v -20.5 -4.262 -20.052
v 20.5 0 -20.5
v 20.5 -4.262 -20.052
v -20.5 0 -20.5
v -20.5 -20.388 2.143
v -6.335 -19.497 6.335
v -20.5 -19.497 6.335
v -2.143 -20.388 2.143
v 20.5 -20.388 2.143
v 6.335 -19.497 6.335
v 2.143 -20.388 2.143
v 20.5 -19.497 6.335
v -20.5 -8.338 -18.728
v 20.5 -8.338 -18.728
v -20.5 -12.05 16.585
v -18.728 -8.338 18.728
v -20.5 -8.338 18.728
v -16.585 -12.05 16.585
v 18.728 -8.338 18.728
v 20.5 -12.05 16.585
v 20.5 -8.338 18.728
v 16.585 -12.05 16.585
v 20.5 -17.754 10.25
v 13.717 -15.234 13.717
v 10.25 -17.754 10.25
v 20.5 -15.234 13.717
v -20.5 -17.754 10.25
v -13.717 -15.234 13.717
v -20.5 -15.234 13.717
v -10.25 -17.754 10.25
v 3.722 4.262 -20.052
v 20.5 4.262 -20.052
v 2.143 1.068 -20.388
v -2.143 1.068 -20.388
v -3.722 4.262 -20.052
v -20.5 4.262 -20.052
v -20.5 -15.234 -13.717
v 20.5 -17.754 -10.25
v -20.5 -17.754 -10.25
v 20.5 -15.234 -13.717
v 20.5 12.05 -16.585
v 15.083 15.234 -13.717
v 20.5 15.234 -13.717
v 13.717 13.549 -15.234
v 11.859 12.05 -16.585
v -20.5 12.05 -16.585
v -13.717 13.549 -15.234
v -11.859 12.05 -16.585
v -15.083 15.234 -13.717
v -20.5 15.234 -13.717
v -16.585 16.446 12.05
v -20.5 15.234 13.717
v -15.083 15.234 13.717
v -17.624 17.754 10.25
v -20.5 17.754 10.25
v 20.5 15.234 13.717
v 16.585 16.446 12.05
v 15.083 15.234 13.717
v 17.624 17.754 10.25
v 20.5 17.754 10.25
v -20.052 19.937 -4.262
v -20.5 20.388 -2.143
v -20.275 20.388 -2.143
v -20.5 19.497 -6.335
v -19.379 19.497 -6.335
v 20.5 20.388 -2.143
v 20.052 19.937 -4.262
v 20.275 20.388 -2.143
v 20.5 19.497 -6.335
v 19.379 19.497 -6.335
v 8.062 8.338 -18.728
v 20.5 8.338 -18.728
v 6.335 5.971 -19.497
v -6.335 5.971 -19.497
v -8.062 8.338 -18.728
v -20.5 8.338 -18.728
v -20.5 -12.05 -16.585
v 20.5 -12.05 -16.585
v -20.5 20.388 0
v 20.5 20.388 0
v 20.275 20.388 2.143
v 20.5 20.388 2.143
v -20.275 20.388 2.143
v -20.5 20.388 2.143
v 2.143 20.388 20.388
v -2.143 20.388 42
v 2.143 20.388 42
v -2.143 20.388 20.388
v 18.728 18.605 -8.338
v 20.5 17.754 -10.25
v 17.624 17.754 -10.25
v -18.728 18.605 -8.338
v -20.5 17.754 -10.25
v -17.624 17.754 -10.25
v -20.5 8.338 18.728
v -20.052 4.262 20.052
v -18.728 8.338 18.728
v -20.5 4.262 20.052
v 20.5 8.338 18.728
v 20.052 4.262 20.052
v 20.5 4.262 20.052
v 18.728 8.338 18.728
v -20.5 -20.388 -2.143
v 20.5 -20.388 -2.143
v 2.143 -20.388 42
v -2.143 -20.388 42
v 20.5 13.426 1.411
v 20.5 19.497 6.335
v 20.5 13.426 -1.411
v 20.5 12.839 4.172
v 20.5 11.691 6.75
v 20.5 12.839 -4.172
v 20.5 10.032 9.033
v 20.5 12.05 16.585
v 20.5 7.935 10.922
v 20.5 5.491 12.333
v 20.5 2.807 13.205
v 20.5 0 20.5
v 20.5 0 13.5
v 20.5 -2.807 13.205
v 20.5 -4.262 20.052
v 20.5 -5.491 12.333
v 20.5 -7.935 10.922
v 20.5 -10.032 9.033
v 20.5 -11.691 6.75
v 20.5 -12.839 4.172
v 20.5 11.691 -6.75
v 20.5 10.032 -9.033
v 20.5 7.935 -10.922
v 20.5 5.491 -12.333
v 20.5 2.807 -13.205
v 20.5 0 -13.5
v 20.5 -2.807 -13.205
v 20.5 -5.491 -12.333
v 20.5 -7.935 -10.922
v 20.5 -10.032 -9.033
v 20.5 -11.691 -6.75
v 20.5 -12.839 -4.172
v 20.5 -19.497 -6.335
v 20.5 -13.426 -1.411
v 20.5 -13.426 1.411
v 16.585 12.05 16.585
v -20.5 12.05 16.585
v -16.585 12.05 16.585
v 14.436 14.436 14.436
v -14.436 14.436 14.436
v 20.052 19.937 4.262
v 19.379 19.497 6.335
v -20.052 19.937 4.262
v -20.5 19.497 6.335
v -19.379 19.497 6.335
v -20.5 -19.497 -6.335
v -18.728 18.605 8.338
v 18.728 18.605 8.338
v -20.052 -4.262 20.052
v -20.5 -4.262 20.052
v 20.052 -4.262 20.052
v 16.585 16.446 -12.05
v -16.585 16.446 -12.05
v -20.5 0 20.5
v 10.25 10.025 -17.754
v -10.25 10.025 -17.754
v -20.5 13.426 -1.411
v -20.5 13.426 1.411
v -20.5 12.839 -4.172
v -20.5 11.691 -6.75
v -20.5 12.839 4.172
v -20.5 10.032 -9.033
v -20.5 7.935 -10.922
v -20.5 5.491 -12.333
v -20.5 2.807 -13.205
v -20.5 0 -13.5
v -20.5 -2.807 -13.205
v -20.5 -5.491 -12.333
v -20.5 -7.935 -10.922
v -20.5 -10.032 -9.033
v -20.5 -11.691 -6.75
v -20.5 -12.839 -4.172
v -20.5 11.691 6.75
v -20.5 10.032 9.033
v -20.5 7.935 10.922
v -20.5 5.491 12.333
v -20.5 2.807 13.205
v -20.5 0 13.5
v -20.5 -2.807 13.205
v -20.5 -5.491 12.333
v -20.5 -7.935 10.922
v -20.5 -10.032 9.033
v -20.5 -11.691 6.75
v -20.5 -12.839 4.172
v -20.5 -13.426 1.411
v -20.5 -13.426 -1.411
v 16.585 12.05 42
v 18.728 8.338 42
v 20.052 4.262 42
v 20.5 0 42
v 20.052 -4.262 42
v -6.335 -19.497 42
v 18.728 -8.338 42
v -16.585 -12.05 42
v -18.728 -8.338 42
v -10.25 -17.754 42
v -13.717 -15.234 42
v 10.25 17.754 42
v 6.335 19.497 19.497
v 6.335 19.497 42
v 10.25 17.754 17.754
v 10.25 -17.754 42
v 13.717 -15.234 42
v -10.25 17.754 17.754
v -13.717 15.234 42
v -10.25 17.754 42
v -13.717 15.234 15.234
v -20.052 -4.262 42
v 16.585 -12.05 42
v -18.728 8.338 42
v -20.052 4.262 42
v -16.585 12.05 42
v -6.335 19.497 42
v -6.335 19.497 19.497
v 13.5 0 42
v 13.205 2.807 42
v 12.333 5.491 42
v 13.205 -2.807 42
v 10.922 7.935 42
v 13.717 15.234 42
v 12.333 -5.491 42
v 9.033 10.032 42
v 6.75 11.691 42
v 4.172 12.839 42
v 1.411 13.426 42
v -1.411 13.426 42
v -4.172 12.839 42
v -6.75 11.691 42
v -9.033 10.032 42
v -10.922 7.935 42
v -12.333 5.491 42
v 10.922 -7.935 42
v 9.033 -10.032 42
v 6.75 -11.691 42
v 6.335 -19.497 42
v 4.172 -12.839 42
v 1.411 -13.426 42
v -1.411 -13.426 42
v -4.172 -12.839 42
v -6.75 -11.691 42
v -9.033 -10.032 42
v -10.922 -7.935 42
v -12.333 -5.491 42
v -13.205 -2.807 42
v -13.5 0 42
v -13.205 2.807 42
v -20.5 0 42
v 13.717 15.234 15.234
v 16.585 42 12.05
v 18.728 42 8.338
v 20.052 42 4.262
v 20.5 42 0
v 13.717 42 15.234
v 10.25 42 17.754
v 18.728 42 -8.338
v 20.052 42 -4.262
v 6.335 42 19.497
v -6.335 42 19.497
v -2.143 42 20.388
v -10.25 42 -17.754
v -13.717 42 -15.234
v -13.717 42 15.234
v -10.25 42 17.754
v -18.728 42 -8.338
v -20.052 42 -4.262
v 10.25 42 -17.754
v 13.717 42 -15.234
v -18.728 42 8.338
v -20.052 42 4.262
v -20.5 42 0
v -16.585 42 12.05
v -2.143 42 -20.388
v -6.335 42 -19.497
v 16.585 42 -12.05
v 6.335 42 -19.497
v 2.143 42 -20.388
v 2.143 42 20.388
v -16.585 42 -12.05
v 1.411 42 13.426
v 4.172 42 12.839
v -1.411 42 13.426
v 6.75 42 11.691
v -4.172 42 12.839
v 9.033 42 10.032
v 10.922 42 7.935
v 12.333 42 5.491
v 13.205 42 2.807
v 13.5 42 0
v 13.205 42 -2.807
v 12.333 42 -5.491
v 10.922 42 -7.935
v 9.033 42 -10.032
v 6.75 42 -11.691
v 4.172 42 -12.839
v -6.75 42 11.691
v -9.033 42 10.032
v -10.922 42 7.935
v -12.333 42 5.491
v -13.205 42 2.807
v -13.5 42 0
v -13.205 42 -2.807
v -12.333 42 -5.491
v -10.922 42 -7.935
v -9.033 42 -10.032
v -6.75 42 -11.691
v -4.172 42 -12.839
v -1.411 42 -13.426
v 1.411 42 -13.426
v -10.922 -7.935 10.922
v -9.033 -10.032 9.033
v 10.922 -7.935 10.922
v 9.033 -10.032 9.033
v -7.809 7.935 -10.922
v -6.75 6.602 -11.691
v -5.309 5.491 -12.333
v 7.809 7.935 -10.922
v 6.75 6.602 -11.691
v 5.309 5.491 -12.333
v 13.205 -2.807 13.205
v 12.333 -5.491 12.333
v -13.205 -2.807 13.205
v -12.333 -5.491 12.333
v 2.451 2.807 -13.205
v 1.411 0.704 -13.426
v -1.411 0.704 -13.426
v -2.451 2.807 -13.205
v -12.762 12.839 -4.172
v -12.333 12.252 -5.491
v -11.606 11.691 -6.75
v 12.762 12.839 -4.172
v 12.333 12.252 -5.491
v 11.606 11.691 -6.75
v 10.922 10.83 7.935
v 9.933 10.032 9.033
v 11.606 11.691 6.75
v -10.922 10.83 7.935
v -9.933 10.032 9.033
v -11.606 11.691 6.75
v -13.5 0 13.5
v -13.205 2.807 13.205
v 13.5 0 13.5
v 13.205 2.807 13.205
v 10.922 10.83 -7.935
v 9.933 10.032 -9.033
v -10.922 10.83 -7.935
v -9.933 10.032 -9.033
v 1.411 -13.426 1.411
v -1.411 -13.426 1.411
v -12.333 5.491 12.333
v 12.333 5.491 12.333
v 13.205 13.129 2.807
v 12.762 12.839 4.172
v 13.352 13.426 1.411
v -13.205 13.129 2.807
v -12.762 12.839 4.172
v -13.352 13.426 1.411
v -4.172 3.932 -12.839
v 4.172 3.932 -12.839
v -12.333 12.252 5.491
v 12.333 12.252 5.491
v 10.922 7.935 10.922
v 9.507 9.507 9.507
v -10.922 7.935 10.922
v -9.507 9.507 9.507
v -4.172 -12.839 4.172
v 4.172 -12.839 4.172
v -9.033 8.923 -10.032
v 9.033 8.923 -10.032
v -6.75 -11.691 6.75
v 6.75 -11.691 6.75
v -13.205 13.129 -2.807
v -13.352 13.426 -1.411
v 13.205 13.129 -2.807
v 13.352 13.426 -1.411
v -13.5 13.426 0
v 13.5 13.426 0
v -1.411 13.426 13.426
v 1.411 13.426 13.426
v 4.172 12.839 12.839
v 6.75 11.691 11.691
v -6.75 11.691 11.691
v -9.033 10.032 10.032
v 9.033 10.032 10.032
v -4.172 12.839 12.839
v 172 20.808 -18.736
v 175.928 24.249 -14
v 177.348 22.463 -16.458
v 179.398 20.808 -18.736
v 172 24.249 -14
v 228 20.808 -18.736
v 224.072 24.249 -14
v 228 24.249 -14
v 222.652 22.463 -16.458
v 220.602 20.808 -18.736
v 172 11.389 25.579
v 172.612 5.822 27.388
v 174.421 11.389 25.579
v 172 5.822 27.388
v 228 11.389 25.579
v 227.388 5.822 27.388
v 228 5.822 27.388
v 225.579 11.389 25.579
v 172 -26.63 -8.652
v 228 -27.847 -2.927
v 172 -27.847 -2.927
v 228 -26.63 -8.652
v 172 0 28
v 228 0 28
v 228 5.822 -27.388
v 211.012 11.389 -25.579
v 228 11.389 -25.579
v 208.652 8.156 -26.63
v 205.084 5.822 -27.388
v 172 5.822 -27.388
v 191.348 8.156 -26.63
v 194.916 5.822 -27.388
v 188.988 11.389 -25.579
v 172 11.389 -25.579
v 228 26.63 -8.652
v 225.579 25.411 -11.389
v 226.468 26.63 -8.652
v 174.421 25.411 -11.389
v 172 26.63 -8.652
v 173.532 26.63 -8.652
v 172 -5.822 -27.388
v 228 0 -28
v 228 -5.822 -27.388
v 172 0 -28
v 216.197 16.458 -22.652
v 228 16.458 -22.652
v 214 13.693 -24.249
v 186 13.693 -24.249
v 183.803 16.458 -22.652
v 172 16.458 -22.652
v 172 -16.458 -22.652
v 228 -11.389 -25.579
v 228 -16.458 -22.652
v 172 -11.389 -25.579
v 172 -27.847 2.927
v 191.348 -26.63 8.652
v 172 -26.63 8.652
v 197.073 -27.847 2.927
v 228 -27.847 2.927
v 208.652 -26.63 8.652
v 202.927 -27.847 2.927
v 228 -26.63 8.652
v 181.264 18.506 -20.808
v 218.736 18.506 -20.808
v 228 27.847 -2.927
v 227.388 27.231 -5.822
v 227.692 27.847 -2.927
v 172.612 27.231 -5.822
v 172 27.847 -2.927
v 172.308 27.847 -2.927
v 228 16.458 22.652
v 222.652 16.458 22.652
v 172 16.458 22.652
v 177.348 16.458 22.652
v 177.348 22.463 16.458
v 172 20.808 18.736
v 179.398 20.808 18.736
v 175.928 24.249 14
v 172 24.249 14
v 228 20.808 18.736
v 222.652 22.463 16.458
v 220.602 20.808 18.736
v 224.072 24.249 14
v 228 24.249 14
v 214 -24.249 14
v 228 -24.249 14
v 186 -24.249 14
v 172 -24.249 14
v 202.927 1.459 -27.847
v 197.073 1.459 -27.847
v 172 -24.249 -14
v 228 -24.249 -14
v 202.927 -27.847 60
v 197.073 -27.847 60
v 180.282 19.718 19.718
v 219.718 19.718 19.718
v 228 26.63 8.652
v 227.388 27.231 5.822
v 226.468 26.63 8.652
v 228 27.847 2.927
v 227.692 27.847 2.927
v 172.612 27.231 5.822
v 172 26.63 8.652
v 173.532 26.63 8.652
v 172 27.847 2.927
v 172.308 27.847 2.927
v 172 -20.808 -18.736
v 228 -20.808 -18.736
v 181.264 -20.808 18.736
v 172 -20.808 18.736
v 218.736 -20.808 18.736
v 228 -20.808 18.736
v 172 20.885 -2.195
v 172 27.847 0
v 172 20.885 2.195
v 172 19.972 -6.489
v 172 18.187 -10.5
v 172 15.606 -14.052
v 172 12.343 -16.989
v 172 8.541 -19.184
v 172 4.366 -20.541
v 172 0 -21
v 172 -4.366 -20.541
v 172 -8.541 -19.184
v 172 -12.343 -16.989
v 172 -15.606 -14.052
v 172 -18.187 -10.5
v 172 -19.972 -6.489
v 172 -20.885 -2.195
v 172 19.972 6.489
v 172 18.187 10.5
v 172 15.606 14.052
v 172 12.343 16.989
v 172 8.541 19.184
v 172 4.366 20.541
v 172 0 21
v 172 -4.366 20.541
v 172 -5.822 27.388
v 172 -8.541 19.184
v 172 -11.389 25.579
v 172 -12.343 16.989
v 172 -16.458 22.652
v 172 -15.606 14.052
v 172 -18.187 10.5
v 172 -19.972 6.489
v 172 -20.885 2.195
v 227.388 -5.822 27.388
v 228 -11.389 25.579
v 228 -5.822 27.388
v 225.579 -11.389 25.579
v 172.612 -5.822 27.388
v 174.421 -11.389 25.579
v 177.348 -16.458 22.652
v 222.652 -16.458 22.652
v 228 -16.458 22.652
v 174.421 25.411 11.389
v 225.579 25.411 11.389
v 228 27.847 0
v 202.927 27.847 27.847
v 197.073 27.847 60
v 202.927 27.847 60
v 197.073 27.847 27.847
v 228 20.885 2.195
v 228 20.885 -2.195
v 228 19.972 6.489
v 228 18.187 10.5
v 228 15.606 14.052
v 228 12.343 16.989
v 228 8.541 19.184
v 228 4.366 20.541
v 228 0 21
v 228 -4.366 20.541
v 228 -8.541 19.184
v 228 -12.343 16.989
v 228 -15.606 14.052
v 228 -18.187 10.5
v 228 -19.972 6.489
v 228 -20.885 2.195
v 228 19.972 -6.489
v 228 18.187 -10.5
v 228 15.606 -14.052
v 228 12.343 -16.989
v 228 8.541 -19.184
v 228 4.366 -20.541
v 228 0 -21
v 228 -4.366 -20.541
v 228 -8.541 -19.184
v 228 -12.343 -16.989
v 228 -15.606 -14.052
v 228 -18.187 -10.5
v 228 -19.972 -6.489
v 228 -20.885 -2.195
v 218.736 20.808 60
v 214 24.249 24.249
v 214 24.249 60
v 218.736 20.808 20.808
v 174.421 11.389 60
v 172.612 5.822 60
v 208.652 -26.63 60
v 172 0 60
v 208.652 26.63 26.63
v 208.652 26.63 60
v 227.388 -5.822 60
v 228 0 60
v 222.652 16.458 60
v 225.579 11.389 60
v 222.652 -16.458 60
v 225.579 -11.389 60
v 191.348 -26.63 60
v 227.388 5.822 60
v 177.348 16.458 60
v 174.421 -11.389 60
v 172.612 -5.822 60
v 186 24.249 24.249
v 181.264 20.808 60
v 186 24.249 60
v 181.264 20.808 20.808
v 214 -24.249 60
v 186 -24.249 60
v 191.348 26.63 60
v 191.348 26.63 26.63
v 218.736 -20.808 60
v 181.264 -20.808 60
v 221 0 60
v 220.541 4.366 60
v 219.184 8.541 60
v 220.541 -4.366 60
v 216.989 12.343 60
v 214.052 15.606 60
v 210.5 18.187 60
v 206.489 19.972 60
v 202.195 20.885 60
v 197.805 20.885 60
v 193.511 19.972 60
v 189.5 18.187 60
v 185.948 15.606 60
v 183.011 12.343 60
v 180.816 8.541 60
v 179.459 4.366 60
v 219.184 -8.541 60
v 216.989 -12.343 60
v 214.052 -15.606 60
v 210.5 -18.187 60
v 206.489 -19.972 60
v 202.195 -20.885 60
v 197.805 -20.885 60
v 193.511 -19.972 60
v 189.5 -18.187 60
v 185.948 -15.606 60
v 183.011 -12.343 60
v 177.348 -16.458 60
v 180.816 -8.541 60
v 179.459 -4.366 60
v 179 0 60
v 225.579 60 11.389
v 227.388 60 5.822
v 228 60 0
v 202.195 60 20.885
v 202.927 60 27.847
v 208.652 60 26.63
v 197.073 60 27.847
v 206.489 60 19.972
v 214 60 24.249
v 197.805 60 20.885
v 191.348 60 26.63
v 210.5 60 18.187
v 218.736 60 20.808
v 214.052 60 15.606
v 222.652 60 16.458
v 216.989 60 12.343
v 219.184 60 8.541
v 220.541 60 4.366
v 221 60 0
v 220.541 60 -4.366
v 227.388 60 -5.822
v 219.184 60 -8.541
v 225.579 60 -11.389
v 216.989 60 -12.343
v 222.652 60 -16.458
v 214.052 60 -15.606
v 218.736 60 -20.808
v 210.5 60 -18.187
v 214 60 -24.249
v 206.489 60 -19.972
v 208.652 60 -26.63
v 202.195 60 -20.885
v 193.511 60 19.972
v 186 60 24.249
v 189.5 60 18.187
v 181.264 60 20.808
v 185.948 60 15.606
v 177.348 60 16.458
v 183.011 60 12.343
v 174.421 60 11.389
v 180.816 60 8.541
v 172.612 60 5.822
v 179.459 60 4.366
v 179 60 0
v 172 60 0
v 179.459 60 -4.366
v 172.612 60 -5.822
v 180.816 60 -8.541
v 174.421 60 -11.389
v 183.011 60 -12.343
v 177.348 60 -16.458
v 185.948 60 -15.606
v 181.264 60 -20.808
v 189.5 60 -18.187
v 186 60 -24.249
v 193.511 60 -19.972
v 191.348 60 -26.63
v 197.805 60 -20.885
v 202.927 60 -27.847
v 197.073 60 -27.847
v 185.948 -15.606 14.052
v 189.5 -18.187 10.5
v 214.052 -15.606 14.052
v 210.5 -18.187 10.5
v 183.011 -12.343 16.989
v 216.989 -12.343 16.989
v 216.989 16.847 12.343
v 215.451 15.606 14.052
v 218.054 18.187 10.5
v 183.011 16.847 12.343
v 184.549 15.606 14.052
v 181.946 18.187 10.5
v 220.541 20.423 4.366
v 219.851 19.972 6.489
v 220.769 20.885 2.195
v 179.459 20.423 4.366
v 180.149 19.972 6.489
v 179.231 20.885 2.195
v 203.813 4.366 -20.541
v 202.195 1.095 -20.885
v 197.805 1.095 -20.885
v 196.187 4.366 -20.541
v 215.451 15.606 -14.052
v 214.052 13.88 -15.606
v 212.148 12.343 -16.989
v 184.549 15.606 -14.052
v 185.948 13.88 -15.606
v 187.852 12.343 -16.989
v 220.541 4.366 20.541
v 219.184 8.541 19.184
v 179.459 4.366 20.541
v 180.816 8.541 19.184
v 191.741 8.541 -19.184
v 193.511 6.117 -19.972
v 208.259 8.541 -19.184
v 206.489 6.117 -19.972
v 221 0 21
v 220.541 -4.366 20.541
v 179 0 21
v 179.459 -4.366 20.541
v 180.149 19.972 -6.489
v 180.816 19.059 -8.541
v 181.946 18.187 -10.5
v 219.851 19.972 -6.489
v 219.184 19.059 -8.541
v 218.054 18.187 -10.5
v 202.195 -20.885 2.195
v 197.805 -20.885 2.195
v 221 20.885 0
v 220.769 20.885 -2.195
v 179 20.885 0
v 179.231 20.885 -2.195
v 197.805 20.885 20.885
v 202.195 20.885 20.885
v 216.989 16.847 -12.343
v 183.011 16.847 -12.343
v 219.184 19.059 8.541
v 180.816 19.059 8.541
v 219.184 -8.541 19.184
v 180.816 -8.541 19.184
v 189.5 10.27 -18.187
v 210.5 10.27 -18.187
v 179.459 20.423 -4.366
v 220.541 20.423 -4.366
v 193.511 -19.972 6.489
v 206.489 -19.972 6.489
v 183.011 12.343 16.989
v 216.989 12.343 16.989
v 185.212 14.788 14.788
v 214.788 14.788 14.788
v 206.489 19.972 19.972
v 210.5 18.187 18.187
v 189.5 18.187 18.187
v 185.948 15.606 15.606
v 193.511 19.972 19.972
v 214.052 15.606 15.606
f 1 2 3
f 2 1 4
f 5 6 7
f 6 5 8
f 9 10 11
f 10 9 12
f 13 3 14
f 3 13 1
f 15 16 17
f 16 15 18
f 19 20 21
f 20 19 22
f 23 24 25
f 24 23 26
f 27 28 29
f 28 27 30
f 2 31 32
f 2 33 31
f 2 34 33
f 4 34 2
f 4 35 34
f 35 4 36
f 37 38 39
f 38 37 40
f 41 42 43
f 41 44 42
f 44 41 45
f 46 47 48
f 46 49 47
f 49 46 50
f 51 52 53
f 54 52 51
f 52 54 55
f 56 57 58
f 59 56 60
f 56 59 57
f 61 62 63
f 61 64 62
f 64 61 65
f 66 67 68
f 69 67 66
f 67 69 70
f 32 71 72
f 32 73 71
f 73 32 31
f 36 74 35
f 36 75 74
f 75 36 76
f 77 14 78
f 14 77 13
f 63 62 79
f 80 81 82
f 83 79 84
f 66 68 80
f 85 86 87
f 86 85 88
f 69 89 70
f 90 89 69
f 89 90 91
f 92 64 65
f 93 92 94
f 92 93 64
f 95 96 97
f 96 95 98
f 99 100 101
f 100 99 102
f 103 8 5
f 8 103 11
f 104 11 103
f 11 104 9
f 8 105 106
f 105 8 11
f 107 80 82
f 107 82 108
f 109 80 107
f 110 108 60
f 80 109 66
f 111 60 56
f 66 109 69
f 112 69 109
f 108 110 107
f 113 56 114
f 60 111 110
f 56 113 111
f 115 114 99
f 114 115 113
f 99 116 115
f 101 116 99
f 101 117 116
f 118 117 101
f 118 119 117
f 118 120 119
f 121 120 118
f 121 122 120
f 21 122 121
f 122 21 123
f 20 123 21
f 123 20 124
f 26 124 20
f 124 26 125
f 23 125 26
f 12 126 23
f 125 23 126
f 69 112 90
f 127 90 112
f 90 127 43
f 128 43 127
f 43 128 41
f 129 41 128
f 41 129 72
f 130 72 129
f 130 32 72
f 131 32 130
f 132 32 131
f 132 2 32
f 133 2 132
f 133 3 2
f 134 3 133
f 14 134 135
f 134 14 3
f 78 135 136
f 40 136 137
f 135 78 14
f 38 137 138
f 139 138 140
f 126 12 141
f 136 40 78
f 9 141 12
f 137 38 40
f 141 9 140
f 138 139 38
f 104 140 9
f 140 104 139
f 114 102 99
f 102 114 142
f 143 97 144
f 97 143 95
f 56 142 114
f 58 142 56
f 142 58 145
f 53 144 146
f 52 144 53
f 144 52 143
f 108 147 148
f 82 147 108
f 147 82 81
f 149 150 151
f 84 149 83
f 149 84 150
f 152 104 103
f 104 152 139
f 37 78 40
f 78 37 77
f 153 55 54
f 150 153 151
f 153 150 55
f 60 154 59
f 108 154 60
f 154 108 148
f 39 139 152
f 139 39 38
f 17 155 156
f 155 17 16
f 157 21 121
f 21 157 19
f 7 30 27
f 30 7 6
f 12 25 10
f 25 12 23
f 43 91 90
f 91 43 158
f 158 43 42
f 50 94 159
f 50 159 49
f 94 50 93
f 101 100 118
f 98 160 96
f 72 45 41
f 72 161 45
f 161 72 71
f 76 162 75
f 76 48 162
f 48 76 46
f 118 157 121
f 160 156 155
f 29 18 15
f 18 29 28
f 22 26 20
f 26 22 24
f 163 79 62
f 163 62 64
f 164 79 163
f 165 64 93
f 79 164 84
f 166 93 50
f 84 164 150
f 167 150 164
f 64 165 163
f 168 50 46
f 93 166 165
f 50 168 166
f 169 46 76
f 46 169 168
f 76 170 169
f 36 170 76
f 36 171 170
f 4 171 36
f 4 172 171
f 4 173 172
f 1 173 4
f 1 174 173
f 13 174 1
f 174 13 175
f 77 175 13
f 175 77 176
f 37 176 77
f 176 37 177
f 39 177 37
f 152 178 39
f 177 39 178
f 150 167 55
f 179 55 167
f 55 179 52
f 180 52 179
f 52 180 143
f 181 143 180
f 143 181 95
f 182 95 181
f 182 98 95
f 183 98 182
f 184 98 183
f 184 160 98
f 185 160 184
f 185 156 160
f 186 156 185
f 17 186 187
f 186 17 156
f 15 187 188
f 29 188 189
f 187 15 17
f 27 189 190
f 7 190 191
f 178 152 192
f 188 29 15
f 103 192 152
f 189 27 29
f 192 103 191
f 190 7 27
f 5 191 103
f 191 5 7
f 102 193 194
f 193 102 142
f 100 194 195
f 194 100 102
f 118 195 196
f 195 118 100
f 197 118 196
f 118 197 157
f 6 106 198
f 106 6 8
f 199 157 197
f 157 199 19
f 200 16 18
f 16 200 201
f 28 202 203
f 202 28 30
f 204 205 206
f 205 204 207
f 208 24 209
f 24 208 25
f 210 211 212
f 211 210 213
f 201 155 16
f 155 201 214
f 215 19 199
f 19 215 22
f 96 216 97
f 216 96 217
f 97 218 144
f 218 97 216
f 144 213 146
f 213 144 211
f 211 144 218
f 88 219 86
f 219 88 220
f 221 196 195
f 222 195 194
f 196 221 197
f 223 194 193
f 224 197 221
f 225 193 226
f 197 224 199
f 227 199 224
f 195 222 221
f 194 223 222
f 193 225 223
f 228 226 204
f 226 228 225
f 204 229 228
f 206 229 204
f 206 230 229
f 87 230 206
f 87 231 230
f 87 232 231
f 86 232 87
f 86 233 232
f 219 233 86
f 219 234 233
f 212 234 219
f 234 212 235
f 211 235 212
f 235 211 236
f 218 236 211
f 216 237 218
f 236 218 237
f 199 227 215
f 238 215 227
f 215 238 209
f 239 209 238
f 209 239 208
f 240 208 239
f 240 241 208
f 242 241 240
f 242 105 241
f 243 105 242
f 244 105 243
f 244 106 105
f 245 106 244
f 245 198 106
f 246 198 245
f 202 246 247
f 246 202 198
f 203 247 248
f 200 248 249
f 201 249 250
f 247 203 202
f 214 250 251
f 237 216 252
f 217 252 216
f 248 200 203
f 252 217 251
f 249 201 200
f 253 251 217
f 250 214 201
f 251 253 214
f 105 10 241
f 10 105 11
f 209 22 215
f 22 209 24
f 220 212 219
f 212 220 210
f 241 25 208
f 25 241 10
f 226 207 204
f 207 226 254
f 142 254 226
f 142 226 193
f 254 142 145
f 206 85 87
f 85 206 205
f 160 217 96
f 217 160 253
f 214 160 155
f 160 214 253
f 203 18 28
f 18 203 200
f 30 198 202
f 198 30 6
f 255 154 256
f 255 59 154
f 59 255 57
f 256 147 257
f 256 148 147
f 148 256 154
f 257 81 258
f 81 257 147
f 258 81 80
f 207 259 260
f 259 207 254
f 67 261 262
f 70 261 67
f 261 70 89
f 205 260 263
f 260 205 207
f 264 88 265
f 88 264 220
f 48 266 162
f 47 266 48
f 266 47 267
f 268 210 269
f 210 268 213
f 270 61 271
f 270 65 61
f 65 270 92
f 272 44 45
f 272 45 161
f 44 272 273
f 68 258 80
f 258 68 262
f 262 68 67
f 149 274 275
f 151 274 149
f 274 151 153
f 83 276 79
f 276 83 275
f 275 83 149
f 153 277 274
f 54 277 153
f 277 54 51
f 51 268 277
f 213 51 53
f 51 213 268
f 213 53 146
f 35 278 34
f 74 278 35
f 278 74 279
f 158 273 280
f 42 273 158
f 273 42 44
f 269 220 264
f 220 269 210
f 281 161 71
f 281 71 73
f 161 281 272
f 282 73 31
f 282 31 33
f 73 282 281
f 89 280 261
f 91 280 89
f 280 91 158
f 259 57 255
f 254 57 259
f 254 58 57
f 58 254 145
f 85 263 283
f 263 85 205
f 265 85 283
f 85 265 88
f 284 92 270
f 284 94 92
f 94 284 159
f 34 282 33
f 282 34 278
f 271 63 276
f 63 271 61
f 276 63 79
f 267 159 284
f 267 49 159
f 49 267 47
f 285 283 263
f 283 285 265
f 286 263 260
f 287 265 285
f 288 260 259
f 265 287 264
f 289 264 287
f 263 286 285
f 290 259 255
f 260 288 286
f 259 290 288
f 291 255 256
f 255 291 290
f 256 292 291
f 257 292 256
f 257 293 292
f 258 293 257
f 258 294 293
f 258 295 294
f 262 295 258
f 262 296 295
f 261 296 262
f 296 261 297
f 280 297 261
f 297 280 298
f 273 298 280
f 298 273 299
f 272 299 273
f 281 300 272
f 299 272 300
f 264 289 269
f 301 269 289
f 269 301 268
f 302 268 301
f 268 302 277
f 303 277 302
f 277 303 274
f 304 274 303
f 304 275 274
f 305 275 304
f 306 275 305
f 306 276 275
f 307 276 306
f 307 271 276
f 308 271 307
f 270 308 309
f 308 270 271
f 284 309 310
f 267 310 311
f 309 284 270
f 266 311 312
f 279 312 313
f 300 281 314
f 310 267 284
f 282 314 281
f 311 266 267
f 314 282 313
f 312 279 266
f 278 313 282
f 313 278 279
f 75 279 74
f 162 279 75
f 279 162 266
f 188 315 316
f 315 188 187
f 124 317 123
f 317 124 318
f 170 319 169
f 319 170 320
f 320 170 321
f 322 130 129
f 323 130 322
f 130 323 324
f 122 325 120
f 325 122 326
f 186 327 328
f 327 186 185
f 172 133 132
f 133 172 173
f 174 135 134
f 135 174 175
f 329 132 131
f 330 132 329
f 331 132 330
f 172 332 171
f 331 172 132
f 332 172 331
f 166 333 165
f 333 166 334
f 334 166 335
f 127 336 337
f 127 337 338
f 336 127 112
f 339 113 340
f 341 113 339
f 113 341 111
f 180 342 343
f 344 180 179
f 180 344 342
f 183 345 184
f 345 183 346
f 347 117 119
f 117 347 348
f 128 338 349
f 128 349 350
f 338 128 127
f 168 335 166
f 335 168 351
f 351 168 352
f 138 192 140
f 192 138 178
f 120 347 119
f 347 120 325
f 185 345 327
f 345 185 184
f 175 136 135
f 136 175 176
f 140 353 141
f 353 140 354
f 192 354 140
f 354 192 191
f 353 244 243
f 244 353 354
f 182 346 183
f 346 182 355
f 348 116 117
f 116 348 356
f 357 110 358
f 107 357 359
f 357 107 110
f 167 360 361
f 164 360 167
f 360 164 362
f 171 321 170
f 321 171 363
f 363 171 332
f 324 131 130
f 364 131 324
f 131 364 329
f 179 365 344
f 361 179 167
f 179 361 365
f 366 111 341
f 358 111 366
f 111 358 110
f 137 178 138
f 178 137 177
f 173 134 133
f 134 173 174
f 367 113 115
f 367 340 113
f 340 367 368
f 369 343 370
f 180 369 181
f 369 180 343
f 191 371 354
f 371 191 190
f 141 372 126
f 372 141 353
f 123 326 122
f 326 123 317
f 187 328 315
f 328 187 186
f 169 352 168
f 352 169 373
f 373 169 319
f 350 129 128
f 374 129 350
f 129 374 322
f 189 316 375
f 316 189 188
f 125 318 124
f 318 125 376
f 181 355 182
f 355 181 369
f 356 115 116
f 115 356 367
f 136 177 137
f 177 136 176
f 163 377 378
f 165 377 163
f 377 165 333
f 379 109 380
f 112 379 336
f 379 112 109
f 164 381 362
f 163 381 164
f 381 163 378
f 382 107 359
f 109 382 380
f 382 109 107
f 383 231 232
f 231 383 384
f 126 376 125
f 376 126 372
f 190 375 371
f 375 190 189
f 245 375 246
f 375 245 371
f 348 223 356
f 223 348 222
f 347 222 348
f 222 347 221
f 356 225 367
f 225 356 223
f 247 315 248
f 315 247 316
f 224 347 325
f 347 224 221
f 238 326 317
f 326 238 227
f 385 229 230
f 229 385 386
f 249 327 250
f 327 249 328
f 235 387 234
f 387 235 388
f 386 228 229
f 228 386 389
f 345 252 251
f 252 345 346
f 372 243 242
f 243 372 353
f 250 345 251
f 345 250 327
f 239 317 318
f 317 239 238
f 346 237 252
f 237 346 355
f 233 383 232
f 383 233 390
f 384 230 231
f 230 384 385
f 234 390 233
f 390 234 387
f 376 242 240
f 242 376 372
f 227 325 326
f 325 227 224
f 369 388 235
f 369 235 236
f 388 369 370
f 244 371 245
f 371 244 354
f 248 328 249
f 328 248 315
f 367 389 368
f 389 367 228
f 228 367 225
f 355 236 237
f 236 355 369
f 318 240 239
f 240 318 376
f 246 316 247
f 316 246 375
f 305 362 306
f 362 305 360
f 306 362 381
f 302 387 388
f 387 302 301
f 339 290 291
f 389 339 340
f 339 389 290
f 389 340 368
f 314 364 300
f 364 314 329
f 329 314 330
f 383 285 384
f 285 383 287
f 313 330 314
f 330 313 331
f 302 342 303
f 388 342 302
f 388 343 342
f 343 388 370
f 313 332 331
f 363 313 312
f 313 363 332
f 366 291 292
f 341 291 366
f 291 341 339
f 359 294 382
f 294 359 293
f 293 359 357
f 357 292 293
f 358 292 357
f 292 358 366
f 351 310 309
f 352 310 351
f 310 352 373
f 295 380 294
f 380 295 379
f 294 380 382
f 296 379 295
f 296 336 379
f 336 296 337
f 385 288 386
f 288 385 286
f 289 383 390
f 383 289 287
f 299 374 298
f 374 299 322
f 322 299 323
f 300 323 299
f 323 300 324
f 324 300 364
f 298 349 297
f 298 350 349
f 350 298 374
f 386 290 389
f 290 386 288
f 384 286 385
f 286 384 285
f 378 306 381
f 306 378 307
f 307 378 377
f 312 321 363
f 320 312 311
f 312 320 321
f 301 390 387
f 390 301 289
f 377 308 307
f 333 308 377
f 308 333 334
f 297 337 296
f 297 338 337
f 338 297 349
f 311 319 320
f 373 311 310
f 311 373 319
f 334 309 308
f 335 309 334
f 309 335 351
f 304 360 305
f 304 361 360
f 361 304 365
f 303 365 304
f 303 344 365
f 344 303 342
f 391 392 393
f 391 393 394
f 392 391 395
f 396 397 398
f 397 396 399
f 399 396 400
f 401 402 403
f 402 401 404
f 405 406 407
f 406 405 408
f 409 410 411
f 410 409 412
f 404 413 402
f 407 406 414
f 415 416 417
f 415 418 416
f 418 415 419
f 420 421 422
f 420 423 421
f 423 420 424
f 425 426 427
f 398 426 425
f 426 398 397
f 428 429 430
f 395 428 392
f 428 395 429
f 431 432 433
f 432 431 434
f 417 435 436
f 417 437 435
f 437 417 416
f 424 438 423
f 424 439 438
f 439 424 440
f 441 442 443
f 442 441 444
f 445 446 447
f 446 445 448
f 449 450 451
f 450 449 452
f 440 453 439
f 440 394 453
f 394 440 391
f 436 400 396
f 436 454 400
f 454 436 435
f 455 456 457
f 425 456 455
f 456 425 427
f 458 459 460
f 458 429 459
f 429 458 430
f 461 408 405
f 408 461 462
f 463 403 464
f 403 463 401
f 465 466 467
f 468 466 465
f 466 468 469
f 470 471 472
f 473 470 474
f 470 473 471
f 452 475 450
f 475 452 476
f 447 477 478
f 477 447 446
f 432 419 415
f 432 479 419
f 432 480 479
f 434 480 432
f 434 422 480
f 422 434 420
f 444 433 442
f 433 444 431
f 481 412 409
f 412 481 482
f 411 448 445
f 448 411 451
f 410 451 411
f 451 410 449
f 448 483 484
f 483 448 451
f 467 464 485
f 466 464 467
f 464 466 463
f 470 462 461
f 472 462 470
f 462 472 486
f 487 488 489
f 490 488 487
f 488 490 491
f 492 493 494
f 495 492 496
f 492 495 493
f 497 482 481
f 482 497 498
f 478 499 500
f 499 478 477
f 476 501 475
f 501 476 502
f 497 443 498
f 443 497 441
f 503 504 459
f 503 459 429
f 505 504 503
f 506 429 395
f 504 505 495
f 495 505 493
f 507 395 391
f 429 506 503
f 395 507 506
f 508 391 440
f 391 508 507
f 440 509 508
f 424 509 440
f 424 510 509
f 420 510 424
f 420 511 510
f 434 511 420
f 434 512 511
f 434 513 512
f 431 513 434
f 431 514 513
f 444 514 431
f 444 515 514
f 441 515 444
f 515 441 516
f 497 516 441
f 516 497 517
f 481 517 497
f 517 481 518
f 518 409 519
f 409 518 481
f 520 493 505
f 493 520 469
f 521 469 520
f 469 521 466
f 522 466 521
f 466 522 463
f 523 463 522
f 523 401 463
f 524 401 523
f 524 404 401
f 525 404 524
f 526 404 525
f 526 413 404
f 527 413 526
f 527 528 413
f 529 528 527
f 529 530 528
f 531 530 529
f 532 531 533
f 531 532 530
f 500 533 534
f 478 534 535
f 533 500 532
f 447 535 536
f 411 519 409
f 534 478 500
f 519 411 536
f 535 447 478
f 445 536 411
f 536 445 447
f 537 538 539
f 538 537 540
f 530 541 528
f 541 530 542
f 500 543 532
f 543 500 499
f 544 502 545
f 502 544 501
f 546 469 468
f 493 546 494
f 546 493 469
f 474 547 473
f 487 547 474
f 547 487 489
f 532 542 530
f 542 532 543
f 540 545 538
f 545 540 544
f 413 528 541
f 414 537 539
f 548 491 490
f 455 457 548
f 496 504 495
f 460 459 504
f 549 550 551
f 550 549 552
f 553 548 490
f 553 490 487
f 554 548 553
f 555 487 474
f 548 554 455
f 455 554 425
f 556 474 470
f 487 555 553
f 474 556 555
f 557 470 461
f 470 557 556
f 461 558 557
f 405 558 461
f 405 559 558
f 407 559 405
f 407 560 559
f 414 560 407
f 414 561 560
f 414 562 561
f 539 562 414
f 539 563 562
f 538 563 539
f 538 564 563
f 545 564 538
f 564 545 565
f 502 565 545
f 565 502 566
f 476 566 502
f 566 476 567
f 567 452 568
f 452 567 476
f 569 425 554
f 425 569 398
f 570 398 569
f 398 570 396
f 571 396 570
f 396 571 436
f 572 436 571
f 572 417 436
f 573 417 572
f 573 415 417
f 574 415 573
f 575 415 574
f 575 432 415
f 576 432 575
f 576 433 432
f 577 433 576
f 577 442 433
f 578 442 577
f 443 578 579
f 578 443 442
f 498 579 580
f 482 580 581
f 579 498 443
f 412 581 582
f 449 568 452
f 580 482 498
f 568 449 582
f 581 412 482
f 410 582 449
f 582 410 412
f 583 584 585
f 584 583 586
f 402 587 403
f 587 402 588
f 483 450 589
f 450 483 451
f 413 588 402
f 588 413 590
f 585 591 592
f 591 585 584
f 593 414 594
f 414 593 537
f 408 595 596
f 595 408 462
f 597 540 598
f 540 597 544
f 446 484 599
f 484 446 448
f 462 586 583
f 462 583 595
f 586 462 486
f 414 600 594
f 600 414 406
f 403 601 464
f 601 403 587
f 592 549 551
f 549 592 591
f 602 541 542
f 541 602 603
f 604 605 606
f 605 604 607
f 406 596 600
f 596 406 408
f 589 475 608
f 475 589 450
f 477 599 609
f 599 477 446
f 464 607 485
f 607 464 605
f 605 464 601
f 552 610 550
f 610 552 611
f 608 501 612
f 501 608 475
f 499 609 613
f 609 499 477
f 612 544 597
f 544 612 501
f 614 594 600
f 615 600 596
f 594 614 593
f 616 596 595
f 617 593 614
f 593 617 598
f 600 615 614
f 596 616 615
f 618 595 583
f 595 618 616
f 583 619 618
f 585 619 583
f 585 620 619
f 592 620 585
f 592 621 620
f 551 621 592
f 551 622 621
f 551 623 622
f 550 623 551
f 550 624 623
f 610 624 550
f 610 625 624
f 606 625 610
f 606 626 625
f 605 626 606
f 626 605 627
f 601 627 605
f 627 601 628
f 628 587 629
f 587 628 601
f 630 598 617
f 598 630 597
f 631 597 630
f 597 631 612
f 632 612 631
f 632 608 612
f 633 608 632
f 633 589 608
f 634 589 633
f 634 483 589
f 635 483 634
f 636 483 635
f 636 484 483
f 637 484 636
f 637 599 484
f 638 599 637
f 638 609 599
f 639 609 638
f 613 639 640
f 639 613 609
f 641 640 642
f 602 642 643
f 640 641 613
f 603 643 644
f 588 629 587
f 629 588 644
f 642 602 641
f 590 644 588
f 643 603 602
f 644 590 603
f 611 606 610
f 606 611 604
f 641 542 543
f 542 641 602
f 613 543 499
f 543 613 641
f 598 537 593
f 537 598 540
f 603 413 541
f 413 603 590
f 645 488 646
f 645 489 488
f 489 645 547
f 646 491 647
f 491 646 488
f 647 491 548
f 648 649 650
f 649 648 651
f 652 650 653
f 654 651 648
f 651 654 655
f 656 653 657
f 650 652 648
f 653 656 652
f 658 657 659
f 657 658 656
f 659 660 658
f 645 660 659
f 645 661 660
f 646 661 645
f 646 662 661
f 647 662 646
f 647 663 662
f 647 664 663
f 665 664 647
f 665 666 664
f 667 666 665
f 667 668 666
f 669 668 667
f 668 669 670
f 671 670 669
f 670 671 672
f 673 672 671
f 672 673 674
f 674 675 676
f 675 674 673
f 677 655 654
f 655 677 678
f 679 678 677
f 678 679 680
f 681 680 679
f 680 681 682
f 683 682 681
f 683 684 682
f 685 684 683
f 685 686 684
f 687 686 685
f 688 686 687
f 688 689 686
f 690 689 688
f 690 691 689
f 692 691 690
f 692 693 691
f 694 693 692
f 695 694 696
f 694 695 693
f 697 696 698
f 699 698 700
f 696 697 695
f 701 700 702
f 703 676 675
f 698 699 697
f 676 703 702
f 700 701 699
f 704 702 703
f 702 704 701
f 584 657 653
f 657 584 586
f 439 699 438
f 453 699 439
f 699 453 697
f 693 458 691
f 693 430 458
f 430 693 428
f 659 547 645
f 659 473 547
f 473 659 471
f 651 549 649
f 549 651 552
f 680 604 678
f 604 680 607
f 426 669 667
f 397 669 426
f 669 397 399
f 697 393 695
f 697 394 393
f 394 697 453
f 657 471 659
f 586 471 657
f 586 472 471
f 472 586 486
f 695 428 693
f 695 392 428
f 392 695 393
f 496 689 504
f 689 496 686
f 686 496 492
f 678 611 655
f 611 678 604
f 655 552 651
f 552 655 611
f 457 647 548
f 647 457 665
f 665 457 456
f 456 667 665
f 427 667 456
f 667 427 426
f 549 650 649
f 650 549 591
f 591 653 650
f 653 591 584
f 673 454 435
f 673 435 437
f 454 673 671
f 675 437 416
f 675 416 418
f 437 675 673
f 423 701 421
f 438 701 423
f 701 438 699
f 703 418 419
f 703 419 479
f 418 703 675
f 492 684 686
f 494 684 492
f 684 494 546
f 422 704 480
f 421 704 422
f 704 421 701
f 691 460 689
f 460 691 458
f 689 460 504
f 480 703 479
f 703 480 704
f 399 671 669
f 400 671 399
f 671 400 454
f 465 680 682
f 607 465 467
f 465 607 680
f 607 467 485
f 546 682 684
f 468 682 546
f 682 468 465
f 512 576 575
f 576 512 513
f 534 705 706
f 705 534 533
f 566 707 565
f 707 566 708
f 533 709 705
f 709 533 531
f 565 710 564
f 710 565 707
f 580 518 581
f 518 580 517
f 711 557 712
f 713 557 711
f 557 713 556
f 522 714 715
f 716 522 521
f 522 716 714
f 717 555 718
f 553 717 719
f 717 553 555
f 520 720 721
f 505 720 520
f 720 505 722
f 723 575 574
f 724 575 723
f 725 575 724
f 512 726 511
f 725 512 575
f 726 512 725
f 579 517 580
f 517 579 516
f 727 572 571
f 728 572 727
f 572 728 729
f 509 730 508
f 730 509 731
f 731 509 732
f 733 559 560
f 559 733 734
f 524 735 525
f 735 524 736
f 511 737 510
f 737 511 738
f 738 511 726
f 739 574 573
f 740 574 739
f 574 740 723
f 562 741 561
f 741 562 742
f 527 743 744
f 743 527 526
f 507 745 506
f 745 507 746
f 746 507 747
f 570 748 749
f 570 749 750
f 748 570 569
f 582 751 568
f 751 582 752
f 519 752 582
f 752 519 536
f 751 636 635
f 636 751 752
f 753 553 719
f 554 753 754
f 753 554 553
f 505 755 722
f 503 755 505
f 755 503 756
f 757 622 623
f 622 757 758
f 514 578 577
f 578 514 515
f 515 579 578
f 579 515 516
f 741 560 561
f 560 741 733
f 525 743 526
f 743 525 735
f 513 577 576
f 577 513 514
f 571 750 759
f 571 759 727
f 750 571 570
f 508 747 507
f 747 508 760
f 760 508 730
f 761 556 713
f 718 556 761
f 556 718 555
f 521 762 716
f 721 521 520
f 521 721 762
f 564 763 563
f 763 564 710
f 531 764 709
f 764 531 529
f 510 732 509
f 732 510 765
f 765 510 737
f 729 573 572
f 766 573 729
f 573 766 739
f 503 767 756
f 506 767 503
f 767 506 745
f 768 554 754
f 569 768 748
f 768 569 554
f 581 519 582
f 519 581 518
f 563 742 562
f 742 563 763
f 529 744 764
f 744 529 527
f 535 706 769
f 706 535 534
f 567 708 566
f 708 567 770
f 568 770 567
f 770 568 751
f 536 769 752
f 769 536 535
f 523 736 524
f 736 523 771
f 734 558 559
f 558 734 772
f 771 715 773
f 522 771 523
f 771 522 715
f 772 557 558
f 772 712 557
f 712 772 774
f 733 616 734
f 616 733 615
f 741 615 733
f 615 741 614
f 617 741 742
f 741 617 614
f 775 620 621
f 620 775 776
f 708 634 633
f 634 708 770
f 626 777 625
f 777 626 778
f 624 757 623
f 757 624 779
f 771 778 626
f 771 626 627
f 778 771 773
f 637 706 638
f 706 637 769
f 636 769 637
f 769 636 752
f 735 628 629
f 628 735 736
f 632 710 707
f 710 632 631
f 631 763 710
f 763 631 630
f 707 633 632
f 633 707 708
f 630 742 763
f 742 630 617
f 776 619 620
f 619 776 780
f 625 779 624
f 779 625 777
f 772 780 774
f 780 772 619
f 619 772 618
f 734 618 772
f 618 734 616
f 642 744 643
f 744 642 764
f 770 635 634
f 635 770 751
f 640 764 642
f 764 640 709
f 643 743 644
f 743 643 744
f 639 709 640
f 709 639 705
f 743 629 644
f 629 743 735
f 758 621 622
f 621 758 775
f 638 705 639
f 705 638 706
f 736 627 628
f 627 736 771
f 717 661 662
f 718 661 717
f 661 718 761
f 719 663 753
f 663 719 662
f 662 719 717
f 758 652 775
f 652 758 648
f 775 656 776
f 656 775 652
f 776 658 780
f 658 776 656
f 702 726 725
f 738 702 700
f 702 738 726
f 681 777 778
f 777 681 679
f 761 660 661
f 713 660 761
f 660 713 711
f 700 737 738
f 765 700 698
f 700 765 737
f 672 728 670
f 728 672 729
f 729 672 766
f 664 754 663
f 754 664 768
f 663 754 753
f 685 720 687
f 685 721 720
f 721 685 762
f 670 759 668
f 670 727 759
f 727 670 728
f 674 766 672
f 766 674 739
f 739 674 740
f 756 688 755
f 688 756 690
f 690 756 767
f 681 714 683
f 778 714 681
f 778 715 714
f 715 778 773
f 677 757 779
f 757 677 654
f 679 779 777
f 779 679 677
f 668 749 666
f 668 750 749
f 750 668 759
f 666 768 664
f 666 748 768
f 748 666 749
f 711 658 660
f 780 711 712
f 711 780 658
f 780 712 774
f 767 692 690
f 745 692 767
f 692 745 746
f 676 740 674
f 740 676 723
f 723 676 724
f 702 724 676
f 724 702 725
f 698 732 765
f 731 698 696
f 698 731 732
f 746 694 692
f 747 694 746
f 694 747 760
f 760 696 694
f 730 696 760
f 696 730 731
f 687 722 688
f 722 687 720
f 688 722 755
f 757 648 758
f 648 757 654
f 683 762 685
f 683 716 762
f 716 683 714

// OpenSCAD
// file: tube_clamp_square_base_plate_132_functions.scad
function get_L_shaft_with_base_plate_square_base_plate_132(beam_width) = 
    // (beam_width == 40) ?
    75
;
function get_R_plate_square_base_plate_132(beam_width) = 
    // (beam_width == 40) ?
    [143, 75, 18.5]
;
function get_thickness_square_base_plate_132(beam_width) = 
    // (beam_width == 40) ?
    8
;
function get_offset_hole_x_square_base_plate_132(beam_width) = 
    // (beam_width == 40) ?
    100 / 2
;
function get_diameter_hole_square_base_plate_132(beam_width) = 
    // (beam_width == 40) ?
    10
;
// file: tube_clamp_round_base_plate_132_functions.scad
function get_L_shaft_with_base_plate_round_base_plate_132(tube_diameter) = 
    (tube_diameter == 27) ? 
        85
    : (tube_diameter == 42) ?
        122
    : 25
;
function get_R_plate_round_base_plate_132(tube_diameter) = 
    (tube_diameter == 27) ? 
        [64, 114, 7]
    : (tube_diameter == 42) ?
        [80, 140, 10]
    : [10, 20, 1]
;
function get_offset_hole_y_round_base_plate_132(tube_diameter) = 
    (tube_diameter == 27) ? 
        38
    : (tube_diameter == 42) ?
        50
    : 10
;
function get_diameter_hole_round_base_plate_132(tube_diameter) = 10;
// file: tube_clamp_round_tee_long_104_functions.scad
// include <../../config.scad>;

function get_L_shaft_long_round_tee_long_104(tube_diameter) = 
    (tube_diameter == 27) ? 
        85
    : (tube_diameter == 42) ?
        122
    : 25
;
function get_L_shaft_short_round_tee_long_104(tube_diameter) = 
    (tube_diameter == 27) ? 
        42
    : (tube_diameter == 42) ?
        61
    : 10
;
// file: ../brake/brake_assembly_functions.scad
// include <../../config.scad>; // circular reference!

function get_y_pos_lead_fixing_ballscrew_to_brake_arms(angle_brake_rod, y_pos_axle_rear, x_pos_axle_leg_rear, x_offset_fixing_brake_arm_to_lead_plate) = y_pos_axle_rear - (x_pos_axle_leg_rear - x_offset_fixing_brake_arm_to_lead_plate) / tan(angle_brake_rod); // (X_POS_AXLE_LEG_REAR - X_OFFSET_FIXING_BRAKE_ARM_TO_LEAD_PLATE)
// file: ../common/metric_bolt_functions.scad
function get_metric_bolt_head_height(size) = size;
function get_metric_bolt_head_diameter(size) = size * 2;
function get_metric_bolt_washer_diameter_safe_working_clearance(size) = 
    (size < 20) ?
        4 * size
    :
        3 * size
;
// file: tube_clamp_round_3_way_through_116_functions.scad
function  get_L_shaft_long_round_3_way_through_116(tube_diameter) = 
    (tube_diameter == 27) ? 
        42
    : (tube_diameter == 42) ?
        60
    : 25
;
function get_thickness_round_3_way_through_116(tube_diameter) = 7;
function get_L_shaft_short_round_3_way_through_116(tube_diameter) = tube_diameter + 2 * get_thickness_round_3_way_through_116();
// main file
include <../../config.scad>;
use <./tube_clamp_round_3_way_through_116_functions.scad>;

module tube_clamp_round_3_way_through_116(tube_diameter) {
    t = get_thickness_round_3_way_through_116(tube_diameter);
    L_shaft_long = get_L_shaft_long_round_3_way_through_116(tube_diameter);
    L_shaft_short = get_L_shaft_short_round_3_way_through_116(tube_diameter);
    color("LightGrey") difference() {
        union() {
            // short horizontal section
            rotate([0, 90, 0]) cylinder(L_shaft_short, tube_diameter / 2 + t, tube_diameter / 2 + t, center = true);
            // long vertical section
            translate([0, 0, L_shaft_long / 2]) rotate([0, 0, 0]) cylinder(L_shaft_long, tube_diameter / 2 + t, tube_diameter / 2 + t, center = true);
            // long horizontal section
            translate([0, L_shaft_long / 2, 0]) rotate([90, 0, 0]) cylinder(L_shaft_long, tube_diameter / 2 + t, tube_diameter / 2 + t, center = true);
        }
        rotate([0, 90, 0]) cylinder(L_shaft_short, tube_diameter / 2, tube_diameter / 2, center = true);
        translate([0, 0, L_shaft_long / 2]) rotate([0, 0, 0]) cylinder(L_shaft_long, tube_diameter / 2, tube_diameter / 2, center = true);
        translate([0, L_shaft_long / 2, 0]) rotate([90, 0, 0]) cylinder(L_shaft_long, tube_diameter / 2, tube_diameter / 2, center = true);
    }
    // Shopping
    echo(str("Round 3-way through 116: Tube clamp Φ", tube_diameter, "mm - x1"));
}

// test output
tube_clamp_round_3_way_through_116(27);
translate([200, 0, 0]) tube_clamp_round_3_way_through_116(42);
